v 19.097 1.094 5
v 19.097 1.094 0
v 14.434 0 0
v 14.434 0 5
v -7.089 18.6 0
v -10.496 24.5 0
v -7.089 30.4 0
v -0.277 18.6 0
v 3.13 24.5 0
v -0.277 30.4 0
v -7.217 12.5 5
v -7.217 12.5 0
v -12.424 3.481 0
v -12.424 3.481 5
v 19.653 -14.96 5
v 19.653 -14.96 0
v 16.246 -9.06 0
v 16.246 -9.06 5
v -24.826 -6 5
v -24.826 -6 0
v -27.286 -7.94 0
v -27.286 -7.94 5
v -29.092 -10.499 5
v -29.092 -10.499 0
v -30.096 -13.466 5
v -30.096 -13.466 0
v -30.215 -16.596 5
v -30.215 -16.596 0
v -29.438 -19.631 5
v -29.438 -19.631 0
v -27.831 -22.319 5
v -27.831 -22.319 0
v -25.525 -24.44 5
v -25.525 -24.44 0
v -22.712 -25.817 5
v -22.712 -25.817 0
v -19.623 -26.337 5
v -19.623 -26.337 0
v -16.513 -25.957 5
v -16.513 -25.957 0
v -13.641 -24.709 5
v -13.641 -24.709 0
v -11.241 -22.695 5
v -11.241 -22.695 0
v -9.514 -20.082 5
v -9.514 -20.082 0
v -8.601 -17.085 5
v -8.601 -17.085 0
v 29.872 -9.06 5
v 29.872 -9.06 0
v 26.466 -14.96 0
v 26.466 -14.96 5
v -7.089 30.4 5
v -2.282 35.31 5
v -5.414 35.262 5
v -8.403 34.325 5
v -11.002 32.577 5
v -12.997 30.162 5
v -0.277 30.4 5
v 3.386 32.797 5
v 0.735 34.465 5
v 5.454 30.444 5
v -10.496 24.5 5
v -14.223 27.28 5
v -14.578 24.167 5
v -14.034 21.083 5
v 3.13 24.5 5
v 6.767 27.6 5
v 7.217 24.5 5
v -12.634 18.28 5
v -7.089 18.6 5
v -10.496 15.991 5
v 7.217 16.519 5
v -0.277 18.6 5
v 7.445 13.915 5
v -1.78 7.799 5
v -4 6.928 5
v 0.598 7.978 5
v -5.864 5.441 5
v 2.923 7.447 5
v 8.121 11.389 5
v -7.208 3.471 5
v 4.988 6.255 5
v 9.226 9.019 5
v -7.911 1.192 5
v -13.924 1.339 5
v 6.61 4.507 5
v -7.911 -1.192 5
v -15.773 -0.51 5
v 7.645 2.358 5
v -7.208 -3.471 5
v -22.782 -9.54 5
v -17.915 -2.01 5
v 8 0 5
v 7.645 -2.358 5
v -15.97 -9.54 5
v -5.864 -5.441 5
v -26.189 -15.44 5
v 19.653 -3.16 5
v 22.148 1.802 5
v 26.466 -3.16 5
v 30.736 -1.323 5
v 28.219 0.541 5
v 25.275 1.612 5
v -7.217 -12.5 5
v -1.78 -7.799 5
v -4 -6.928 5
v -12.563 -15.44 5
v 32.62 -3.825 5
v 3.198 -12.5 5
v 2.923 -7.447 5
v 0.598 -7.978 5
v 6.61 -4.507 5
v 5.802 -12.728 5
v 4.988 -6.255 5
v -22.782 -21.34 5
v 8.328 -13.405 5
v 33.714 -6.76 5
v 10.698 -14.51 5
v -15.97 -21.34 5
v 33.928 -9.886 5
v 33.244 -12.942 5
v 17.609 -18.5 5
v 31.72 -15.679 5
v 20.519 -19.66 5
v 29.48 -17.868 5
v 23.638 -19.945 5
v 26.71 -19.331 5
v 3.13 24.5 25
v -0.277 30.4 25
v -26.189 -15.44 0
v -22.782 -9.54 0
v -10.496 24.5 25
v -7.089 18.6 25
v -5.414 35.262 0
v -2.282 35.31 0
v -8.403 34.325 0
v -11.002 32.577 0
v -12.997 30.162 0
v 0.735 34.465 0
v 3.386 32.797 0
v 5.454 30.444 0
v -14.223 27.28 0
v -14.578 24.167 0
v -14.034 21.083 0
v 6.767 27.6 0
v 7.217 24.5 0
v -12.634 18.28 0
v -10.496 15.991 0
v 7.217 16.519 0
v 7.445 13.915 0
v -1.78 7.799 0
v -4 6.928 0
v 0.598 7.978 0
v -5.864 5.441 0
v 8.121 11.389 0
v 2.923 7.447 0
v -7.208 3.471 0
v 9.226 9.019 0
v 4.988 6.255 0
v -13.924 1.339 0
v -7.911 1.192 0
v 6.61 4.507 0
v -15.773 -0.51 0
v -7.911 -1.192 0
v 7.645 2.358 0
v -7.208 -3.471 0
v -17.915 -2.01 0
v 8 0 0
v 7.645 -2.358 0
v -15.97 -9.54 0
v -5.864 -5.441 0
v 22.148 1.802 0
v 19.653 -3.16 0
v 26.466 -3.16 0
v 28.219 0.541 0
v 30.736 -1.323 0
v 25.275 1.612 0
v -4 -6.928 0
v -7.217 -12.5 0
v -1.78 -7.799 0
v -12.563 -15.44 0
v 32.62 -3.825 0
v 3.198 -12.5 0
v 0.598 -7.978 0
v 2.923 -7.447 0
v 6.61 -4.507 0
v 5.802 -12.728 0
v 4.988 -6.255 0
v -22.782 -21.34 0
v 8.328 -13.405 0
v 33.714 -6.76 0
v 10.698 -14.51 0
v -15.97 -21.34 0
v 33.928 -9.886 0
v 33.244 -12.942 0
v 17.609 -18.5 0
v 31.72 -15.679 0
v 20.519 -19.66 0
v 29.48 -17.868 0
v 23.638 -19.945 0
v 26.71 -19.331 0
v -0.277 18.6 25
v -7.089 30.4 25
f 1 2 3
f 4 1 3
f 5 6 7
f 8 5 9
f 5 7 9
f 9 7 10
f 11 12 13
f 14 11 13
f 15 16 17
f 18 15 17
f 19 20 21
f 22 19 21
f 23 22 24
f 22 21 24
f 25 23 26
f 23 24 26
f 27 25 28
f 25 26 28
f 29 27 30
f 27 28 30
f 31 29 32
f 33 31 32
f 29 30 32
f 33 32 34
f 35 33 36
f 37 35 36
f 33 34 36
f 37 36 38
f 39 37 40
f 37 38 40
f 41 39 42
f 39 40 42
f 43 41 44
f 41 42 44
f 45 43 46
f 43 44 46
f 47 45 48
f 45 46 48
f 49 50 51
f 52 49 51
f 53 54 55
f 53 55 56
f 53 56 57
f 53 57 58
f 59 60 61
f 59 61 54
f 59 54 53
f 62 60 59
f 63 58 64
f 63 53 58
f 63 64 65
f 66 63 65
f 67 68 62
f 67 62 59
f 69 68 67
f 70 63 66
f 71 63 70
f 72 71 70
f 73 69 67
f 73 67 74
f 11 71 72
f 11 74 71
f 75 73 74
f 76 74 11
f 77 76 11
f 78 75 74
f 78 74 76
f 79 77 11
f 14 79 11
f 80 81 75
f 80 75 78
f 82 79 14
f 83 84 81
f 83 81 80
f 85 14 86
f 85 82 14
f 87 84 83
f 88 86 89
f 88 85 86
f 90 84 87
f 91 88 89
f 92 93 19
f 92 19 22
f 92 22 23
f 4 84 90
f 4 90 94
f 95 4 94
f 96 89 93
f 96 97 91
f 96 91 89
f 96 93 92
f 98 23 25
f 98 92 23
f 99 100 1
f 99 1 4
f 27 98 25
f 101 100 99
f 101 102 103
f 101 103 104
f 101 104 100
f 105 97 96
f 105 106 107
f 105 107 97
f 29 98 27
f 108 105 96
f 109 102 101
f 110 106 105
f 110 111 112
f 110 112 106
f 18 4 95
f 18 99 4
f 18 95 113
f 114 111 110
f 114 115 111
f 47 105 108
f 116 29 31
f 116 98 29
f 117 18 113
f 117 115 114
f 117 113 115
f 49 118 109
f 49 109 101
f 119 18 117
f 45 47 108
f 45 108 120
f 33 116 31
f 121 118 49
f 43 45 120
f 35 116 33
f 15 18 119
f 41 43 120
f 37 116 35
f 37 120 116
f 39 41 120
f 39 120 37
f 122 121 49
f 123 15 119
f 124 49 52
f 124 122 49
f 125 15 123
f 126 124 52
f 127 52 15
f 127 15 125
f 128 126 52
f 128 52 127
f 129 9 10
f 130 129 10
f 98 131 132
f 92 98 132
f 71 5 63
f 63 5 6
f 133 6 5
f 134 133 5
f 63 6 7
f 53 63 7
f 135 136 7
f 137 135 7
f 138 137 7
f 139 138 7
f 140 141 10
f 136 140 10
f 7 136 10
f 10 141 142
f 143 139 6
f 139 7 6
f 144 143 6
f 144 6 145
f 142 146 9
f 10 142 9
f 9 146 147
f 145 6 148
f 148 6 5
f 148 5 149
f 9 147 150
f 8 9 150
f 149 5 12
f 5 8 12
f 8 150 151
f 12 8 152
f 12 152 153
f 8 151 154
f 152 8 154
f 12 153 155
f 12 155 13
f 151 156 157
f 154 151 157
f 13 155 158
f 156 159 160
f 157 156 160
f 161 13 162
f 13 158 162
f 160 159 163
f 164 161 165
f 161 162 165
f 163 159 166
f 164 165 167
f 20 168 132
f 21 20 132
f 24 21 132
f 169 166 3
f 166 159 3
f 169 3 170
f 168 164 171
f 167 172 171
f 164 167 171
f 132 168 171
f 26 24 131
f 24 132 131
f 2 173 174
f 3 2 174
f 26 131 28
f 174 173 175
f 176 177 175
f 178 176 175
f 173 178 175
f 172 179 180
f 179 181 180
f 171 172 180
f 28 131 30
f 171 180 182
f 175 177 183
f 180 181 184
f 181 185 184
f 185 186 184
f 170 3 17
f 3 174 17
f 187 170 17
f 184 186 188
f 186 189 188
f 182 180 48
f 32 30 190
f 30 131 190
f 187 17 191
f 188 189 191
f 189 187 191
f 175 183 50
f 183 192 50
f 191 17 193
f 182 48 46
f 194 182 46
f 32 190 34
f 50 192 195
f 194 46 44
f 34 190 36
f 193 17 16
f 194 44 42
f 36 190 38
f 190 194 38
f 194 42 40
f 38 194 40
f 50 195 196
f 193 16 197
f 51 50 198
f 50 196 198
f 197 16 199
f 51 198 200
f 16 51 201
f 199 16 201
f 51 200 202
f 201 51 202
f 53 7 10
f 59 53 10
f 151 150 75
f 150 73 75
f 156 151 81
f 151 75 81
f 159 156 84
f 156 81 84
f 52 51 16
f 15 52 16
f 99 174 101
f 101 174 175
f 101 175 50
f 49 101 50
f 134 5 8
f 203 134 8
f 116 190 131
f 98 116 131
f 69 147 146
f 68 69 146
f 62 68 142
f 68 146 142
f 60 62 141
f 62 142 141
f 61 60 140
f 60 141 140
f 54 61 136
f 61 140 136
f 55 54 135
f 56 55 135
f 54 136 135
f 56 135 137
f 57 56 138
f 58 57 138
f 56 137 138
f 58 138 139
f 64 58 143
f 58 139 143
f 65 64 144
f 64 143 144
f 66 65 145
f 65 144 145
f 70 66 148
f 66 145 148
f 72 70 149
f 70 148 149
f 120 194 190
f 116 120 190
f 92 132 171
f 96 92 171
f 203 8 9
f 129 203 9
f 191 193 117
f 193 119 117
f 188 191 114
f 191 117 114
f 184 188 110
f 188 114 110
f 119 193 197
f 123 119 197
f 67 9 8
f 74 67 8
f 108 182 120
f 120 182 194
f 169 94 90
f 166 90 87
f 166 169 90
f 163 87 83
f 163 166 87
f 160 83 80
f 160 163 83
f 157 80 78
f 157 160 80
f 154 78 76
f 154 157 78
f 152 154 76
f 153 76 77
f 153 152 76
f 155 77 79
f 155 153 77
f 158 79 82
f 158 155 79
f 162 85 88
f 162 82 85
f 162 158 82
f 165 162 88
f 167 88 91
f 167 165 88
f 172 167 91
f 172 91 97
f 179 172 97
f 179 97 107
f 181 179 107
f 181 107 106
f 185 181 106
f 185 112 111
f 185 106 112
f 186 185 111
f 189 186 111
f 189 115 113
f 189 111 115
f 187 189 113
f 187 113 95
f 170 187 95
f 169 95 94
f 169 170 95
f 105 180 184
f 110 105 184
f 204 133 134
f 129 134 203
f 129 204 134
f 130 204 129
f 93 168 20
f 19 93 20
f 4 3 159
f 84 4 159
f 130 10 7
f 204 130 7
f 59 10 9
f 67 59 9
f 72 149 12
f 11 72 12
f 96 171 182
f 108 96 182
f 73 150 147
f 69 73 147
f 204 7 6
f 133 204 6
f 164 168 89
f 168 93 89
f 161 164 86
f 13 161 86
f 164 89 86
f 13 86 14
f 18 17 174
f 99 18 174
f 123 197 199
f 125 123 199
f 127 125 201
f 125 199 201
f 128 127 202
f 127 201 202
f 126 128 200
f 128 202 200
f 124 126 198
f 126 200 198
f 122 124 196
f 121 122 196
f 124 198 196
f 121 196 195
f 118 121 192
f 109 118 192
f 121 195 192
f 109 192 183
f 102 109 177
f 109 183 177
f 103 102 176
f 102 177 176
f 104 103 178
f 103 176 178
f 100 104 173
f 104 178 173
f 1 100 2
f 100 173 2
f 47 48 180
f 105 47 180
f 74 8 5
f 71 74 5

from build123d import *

# Parameters (mm, degrees)
F0_R     = 8
F1_DEPTH = 5
F2_DEPTH = 5
F3_COUNT = 3
F4_DEPTH = 25
F5_R     = 15


# Not quite as in the source:
# - a feature names something its author has since deleted; it is built from what else it names


with BuildPart() as f1:
    # F0 (on Top) → F1 (new body)
    with BuildSketch(Plane.XY):
        Polygon((7.2168783649, 12.5), (-7.2168783649, 12.5), (-14.4337567297, 0), (-7.2168783649, -12.5), (7.2168783649, -12.5), (14.4337567297, 0), align=None)
        Circle(F0_R, mode=Mode.SUBTRACT)
    extrude(amount=F1_DEPTH)

    # F0 (on Top) → F2 (join)
    with BuildSketch(Plane.XY):
        with BuildLine():
            Line((-10.4958548116, 15.991376923), (-7.2168783649, 12.5))
            Line((-7.2168783649, 12.5), (7.2168783649, 12.5))
            Line((7.2168783649, 12.5), (7.2168783649, 24.5))
            ThreePointArc((7.2168783649, 24.5), (-8.4028254594, 34.3251918969), (-10.4958548116, 15.991376923))
        make_face()
        Polygon((-10.4958548116, 24.5), (-7.0894882233, 30.4), (-0.2767550469, 30.4), (3.1296115413, 24.5), (-0.2767550469, 18.6), (-7.0894882233, 18.6), align=None, mode=Mode.SUBTRACT)
    extrude(amount=F2_DEPTH)

    # F3: F1 ×3 about axis
    f3_axis = Axis((0, 0, 0), (0, 0, 1))


with BuildPart() as f1_1:
    add(f1.part)
    for i in range(1, F3_COUNT):
        add(f1.part.rotate(f3_axis, i * 360 / F3_COUNT))

    # F5
    f5_edges = [f1_1.edges().sort_by_distance(p)[0] for p in [
        (7.216878, 12.5, 2.5),
        (7.216878, -12.5, 2.5),
        (-14.433757, 0, 2.5),
    ]]
    fillet(f5_edges, radius=F5_R)


with BuildPart() as f4:
    # F0 (on Top) → F4 (new body)
    with BuildSketch(Plane.XY):
        Polygon((-0.2767550469, 30.4), (-7.0894882233, 30.4), (-10.4958548116, 24.5), (-7.0894882233, 18.6), (-0.2767550469, 18.6), (3.1296115413, 24.5), align=None)
    extrude(amount=F4_DEPTH)


solid = Compound([f1_1.part, f4.part])
